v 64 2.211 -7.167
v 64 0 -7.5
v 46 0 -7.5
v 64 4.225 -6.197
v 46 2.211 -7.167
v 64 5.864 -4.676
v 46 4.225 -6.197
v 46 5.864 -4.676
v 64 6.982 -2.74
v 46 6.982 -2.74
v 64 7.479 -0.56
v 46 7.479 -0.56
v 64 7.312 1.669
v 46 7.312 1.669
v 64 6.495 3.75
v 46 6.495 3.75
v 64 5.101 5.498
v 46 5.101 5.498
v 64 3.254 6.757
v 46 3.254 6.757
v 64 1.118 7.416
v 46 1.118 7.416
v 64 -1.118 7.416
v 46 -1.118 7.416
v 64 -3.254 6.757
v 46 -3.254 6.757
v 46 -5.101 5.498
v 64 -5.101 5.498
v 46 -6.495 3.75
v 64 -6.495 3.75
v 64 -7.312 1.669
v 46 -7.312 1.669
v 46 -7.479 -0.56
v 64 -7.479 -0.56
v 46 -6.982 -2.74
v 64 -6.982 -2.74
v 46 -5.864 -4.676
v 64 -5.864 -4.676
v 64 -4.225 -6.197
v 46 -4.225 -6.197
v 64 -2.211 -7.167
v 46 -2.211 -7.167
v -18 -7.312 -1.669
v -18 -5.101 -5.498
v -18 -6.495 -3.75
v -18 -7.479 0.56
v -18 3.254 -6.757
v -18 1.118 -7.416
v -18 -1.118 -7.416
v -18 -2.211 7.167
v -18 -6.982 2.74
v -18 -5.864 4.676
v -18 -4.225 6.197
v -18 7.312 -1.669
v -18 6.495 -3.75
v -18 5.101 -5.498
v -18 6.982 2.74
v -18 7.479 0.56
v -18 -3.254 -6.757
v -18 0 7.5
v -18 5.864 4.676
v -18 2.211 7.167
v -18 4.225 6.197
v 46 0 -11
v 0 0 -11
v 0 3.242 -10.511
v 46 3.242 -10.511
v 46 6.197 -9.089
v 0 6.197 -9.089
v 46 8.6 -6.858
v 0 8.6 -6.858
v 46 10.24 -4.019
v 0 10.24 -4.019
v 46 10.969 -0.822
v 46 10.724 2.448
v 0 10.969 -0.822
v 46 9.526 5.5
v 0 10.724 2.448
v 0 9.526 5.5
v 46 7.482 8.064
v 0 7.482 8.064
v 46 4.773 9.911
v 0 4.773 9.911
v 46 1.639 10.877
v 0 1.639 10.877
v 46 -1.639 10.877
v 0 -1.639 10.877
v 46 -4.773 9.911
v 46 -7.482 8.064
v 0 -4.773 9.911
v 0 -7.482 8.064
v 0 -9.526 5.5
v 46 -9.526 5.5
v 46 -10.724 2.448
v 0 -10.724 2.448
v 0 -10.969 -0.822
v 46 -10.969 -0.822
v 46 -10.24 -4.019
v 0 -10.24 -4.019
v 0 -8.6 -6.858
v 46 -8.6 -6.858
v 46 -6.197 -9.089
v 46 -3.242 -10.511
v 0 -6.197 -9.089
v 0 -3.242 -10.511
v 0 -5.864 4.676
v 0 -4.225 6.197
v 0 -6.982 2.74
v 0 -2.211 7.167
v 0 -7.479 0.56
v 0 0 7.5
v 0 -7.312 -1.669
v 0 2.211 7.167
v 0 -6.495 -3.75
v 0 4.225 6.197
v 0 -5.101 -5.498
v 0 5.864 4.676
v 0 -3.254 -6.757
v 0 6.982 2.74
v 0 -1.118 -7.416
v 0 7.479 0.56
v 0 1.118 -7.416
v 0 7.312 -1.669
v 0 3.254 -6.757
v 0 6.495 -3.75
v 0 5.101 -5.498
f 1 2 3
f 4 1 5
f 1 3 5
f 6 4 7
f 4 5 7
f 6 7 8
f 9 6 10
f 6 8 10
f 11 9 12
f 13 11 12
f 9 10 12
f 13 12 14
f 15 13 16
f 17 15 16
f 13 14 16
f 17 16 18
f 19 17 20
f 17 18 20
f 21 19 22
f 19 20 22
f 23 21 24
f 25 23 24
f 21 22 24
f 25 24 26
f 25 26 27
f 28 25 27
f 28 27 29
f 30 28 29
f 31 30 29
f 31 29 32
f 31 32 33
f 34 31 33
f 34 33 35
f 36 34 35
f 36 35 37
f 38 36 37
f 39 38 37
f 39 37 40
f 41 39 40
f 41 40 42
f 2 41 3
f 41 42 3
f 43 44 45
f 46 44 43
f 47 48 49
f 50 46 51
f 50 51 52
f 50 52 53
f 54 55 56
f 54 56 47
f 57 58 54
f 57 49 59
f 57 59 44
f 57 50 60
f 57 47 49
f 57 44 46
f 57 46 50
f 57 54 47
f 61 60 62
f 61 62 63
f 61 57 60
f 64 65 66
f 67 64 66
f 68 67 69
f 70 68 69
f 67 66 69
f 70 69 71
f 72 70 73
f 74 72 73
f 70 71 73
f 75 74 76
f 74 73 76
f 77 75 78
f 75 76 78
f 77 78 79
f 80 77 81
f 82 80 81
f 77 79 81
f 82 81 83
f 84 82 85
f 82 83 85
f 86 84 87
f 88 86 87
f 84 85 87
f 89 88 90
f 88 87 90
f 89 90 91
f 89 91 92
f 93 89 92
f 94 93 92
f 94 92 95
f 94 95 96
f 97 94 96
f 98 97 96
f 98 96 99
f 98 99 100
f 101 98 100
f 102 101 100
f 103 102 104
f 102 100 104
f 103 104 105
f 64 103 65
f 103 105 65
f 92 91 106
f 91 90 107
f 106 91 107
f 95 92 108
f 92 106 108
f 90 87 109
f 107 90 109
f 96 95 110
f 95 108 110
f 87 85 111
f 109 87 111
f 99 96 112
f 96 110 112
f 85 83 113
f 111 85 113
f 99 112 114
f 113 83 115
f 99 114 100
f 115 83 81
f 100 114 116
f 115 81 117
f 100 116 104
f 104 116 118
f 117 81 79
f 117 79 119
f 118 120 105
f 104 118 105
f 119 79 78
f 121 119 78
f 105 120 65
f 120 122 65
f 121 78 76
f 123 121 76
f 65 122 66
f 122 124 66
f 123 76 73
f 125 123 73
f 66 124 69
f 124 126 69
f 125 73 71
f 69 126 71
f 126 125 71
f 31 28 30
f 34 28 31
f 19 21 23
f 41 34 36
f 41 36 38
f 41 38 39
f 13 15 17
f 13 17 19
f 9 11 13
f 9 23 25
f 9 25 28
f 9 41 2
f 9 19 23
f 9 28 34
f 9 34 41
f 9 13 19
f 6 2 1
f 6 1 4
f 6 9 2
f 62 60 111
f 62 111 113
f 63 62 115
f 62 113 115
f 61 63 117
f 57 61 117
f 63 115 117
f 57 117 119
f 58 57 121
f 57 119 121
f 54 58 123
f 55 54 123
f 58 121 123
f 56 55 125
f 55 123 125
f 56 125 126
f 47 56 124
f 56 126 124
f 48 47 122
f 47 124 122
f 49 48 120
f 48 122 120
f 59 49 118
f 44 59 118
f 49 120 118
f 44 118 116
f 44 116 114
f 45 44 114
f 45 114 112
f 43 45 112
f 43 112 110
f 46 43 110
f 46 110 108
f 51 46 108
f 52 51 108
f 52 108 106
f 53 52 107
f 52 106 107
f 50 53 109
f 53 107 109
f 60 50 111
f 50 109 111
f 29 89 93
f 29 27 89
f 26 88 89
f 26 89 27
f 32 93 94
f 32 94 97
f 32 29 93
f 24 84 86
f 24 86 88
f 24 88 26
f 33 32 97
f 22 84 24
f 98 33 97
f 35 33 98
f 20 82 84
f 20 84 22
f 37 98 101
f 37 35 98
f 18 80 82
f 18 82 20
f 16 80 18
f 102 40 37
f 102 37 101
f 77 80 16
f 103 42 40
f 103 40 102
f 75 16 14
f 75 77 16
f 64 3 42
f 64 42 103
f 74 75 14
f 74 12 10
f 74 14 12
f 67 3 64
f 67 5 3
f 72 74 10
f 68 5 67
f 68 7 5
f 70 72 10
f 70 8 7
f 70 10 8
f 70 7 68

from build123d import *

# Parameters (mm, degrees)
SKETCH1_R           = 11
BOSS_EXTRUDE1_DEPTH = 46
SKETCH2_R           = 7.5
BOSS_EXTRUDE2_DEPTH = 18
SKETCH3_R           = 7.5
BOSS_EXTRUDE3_DEPTH = 18


with BuildPart() as part:
    # Sketch1 → Boss-Extrude1 (new body)
    with BuildSketch(Plane(origin=(0, 0, 0), x_dir=(0, 0, -1), z_dir=(1, 0, 0))):
        Circle(SKETCH1_R)
    extrude(amount=BOSS_EXTRUDE1_DEPTH)

    # Sketch2 → Boss-Extrude2 (add)
    with BuildSketch(Plane(origin=(46, 0, 0), x_dir=(0, 0, -1), z_dir=(1, 0, 0))):
        Circle(SKETCH2_R)
    extrude(amount=BOSS_EXTRUDE2_DEPTH)

    # Sketch3 → Boss-Extrude3 (add)
    with BuildSketch(Plane.ZY):
        Circle(SKETCH3_R)
    extrude(amount=BOSS_EXTRUDE3_DEPTH)


solid = part.part
